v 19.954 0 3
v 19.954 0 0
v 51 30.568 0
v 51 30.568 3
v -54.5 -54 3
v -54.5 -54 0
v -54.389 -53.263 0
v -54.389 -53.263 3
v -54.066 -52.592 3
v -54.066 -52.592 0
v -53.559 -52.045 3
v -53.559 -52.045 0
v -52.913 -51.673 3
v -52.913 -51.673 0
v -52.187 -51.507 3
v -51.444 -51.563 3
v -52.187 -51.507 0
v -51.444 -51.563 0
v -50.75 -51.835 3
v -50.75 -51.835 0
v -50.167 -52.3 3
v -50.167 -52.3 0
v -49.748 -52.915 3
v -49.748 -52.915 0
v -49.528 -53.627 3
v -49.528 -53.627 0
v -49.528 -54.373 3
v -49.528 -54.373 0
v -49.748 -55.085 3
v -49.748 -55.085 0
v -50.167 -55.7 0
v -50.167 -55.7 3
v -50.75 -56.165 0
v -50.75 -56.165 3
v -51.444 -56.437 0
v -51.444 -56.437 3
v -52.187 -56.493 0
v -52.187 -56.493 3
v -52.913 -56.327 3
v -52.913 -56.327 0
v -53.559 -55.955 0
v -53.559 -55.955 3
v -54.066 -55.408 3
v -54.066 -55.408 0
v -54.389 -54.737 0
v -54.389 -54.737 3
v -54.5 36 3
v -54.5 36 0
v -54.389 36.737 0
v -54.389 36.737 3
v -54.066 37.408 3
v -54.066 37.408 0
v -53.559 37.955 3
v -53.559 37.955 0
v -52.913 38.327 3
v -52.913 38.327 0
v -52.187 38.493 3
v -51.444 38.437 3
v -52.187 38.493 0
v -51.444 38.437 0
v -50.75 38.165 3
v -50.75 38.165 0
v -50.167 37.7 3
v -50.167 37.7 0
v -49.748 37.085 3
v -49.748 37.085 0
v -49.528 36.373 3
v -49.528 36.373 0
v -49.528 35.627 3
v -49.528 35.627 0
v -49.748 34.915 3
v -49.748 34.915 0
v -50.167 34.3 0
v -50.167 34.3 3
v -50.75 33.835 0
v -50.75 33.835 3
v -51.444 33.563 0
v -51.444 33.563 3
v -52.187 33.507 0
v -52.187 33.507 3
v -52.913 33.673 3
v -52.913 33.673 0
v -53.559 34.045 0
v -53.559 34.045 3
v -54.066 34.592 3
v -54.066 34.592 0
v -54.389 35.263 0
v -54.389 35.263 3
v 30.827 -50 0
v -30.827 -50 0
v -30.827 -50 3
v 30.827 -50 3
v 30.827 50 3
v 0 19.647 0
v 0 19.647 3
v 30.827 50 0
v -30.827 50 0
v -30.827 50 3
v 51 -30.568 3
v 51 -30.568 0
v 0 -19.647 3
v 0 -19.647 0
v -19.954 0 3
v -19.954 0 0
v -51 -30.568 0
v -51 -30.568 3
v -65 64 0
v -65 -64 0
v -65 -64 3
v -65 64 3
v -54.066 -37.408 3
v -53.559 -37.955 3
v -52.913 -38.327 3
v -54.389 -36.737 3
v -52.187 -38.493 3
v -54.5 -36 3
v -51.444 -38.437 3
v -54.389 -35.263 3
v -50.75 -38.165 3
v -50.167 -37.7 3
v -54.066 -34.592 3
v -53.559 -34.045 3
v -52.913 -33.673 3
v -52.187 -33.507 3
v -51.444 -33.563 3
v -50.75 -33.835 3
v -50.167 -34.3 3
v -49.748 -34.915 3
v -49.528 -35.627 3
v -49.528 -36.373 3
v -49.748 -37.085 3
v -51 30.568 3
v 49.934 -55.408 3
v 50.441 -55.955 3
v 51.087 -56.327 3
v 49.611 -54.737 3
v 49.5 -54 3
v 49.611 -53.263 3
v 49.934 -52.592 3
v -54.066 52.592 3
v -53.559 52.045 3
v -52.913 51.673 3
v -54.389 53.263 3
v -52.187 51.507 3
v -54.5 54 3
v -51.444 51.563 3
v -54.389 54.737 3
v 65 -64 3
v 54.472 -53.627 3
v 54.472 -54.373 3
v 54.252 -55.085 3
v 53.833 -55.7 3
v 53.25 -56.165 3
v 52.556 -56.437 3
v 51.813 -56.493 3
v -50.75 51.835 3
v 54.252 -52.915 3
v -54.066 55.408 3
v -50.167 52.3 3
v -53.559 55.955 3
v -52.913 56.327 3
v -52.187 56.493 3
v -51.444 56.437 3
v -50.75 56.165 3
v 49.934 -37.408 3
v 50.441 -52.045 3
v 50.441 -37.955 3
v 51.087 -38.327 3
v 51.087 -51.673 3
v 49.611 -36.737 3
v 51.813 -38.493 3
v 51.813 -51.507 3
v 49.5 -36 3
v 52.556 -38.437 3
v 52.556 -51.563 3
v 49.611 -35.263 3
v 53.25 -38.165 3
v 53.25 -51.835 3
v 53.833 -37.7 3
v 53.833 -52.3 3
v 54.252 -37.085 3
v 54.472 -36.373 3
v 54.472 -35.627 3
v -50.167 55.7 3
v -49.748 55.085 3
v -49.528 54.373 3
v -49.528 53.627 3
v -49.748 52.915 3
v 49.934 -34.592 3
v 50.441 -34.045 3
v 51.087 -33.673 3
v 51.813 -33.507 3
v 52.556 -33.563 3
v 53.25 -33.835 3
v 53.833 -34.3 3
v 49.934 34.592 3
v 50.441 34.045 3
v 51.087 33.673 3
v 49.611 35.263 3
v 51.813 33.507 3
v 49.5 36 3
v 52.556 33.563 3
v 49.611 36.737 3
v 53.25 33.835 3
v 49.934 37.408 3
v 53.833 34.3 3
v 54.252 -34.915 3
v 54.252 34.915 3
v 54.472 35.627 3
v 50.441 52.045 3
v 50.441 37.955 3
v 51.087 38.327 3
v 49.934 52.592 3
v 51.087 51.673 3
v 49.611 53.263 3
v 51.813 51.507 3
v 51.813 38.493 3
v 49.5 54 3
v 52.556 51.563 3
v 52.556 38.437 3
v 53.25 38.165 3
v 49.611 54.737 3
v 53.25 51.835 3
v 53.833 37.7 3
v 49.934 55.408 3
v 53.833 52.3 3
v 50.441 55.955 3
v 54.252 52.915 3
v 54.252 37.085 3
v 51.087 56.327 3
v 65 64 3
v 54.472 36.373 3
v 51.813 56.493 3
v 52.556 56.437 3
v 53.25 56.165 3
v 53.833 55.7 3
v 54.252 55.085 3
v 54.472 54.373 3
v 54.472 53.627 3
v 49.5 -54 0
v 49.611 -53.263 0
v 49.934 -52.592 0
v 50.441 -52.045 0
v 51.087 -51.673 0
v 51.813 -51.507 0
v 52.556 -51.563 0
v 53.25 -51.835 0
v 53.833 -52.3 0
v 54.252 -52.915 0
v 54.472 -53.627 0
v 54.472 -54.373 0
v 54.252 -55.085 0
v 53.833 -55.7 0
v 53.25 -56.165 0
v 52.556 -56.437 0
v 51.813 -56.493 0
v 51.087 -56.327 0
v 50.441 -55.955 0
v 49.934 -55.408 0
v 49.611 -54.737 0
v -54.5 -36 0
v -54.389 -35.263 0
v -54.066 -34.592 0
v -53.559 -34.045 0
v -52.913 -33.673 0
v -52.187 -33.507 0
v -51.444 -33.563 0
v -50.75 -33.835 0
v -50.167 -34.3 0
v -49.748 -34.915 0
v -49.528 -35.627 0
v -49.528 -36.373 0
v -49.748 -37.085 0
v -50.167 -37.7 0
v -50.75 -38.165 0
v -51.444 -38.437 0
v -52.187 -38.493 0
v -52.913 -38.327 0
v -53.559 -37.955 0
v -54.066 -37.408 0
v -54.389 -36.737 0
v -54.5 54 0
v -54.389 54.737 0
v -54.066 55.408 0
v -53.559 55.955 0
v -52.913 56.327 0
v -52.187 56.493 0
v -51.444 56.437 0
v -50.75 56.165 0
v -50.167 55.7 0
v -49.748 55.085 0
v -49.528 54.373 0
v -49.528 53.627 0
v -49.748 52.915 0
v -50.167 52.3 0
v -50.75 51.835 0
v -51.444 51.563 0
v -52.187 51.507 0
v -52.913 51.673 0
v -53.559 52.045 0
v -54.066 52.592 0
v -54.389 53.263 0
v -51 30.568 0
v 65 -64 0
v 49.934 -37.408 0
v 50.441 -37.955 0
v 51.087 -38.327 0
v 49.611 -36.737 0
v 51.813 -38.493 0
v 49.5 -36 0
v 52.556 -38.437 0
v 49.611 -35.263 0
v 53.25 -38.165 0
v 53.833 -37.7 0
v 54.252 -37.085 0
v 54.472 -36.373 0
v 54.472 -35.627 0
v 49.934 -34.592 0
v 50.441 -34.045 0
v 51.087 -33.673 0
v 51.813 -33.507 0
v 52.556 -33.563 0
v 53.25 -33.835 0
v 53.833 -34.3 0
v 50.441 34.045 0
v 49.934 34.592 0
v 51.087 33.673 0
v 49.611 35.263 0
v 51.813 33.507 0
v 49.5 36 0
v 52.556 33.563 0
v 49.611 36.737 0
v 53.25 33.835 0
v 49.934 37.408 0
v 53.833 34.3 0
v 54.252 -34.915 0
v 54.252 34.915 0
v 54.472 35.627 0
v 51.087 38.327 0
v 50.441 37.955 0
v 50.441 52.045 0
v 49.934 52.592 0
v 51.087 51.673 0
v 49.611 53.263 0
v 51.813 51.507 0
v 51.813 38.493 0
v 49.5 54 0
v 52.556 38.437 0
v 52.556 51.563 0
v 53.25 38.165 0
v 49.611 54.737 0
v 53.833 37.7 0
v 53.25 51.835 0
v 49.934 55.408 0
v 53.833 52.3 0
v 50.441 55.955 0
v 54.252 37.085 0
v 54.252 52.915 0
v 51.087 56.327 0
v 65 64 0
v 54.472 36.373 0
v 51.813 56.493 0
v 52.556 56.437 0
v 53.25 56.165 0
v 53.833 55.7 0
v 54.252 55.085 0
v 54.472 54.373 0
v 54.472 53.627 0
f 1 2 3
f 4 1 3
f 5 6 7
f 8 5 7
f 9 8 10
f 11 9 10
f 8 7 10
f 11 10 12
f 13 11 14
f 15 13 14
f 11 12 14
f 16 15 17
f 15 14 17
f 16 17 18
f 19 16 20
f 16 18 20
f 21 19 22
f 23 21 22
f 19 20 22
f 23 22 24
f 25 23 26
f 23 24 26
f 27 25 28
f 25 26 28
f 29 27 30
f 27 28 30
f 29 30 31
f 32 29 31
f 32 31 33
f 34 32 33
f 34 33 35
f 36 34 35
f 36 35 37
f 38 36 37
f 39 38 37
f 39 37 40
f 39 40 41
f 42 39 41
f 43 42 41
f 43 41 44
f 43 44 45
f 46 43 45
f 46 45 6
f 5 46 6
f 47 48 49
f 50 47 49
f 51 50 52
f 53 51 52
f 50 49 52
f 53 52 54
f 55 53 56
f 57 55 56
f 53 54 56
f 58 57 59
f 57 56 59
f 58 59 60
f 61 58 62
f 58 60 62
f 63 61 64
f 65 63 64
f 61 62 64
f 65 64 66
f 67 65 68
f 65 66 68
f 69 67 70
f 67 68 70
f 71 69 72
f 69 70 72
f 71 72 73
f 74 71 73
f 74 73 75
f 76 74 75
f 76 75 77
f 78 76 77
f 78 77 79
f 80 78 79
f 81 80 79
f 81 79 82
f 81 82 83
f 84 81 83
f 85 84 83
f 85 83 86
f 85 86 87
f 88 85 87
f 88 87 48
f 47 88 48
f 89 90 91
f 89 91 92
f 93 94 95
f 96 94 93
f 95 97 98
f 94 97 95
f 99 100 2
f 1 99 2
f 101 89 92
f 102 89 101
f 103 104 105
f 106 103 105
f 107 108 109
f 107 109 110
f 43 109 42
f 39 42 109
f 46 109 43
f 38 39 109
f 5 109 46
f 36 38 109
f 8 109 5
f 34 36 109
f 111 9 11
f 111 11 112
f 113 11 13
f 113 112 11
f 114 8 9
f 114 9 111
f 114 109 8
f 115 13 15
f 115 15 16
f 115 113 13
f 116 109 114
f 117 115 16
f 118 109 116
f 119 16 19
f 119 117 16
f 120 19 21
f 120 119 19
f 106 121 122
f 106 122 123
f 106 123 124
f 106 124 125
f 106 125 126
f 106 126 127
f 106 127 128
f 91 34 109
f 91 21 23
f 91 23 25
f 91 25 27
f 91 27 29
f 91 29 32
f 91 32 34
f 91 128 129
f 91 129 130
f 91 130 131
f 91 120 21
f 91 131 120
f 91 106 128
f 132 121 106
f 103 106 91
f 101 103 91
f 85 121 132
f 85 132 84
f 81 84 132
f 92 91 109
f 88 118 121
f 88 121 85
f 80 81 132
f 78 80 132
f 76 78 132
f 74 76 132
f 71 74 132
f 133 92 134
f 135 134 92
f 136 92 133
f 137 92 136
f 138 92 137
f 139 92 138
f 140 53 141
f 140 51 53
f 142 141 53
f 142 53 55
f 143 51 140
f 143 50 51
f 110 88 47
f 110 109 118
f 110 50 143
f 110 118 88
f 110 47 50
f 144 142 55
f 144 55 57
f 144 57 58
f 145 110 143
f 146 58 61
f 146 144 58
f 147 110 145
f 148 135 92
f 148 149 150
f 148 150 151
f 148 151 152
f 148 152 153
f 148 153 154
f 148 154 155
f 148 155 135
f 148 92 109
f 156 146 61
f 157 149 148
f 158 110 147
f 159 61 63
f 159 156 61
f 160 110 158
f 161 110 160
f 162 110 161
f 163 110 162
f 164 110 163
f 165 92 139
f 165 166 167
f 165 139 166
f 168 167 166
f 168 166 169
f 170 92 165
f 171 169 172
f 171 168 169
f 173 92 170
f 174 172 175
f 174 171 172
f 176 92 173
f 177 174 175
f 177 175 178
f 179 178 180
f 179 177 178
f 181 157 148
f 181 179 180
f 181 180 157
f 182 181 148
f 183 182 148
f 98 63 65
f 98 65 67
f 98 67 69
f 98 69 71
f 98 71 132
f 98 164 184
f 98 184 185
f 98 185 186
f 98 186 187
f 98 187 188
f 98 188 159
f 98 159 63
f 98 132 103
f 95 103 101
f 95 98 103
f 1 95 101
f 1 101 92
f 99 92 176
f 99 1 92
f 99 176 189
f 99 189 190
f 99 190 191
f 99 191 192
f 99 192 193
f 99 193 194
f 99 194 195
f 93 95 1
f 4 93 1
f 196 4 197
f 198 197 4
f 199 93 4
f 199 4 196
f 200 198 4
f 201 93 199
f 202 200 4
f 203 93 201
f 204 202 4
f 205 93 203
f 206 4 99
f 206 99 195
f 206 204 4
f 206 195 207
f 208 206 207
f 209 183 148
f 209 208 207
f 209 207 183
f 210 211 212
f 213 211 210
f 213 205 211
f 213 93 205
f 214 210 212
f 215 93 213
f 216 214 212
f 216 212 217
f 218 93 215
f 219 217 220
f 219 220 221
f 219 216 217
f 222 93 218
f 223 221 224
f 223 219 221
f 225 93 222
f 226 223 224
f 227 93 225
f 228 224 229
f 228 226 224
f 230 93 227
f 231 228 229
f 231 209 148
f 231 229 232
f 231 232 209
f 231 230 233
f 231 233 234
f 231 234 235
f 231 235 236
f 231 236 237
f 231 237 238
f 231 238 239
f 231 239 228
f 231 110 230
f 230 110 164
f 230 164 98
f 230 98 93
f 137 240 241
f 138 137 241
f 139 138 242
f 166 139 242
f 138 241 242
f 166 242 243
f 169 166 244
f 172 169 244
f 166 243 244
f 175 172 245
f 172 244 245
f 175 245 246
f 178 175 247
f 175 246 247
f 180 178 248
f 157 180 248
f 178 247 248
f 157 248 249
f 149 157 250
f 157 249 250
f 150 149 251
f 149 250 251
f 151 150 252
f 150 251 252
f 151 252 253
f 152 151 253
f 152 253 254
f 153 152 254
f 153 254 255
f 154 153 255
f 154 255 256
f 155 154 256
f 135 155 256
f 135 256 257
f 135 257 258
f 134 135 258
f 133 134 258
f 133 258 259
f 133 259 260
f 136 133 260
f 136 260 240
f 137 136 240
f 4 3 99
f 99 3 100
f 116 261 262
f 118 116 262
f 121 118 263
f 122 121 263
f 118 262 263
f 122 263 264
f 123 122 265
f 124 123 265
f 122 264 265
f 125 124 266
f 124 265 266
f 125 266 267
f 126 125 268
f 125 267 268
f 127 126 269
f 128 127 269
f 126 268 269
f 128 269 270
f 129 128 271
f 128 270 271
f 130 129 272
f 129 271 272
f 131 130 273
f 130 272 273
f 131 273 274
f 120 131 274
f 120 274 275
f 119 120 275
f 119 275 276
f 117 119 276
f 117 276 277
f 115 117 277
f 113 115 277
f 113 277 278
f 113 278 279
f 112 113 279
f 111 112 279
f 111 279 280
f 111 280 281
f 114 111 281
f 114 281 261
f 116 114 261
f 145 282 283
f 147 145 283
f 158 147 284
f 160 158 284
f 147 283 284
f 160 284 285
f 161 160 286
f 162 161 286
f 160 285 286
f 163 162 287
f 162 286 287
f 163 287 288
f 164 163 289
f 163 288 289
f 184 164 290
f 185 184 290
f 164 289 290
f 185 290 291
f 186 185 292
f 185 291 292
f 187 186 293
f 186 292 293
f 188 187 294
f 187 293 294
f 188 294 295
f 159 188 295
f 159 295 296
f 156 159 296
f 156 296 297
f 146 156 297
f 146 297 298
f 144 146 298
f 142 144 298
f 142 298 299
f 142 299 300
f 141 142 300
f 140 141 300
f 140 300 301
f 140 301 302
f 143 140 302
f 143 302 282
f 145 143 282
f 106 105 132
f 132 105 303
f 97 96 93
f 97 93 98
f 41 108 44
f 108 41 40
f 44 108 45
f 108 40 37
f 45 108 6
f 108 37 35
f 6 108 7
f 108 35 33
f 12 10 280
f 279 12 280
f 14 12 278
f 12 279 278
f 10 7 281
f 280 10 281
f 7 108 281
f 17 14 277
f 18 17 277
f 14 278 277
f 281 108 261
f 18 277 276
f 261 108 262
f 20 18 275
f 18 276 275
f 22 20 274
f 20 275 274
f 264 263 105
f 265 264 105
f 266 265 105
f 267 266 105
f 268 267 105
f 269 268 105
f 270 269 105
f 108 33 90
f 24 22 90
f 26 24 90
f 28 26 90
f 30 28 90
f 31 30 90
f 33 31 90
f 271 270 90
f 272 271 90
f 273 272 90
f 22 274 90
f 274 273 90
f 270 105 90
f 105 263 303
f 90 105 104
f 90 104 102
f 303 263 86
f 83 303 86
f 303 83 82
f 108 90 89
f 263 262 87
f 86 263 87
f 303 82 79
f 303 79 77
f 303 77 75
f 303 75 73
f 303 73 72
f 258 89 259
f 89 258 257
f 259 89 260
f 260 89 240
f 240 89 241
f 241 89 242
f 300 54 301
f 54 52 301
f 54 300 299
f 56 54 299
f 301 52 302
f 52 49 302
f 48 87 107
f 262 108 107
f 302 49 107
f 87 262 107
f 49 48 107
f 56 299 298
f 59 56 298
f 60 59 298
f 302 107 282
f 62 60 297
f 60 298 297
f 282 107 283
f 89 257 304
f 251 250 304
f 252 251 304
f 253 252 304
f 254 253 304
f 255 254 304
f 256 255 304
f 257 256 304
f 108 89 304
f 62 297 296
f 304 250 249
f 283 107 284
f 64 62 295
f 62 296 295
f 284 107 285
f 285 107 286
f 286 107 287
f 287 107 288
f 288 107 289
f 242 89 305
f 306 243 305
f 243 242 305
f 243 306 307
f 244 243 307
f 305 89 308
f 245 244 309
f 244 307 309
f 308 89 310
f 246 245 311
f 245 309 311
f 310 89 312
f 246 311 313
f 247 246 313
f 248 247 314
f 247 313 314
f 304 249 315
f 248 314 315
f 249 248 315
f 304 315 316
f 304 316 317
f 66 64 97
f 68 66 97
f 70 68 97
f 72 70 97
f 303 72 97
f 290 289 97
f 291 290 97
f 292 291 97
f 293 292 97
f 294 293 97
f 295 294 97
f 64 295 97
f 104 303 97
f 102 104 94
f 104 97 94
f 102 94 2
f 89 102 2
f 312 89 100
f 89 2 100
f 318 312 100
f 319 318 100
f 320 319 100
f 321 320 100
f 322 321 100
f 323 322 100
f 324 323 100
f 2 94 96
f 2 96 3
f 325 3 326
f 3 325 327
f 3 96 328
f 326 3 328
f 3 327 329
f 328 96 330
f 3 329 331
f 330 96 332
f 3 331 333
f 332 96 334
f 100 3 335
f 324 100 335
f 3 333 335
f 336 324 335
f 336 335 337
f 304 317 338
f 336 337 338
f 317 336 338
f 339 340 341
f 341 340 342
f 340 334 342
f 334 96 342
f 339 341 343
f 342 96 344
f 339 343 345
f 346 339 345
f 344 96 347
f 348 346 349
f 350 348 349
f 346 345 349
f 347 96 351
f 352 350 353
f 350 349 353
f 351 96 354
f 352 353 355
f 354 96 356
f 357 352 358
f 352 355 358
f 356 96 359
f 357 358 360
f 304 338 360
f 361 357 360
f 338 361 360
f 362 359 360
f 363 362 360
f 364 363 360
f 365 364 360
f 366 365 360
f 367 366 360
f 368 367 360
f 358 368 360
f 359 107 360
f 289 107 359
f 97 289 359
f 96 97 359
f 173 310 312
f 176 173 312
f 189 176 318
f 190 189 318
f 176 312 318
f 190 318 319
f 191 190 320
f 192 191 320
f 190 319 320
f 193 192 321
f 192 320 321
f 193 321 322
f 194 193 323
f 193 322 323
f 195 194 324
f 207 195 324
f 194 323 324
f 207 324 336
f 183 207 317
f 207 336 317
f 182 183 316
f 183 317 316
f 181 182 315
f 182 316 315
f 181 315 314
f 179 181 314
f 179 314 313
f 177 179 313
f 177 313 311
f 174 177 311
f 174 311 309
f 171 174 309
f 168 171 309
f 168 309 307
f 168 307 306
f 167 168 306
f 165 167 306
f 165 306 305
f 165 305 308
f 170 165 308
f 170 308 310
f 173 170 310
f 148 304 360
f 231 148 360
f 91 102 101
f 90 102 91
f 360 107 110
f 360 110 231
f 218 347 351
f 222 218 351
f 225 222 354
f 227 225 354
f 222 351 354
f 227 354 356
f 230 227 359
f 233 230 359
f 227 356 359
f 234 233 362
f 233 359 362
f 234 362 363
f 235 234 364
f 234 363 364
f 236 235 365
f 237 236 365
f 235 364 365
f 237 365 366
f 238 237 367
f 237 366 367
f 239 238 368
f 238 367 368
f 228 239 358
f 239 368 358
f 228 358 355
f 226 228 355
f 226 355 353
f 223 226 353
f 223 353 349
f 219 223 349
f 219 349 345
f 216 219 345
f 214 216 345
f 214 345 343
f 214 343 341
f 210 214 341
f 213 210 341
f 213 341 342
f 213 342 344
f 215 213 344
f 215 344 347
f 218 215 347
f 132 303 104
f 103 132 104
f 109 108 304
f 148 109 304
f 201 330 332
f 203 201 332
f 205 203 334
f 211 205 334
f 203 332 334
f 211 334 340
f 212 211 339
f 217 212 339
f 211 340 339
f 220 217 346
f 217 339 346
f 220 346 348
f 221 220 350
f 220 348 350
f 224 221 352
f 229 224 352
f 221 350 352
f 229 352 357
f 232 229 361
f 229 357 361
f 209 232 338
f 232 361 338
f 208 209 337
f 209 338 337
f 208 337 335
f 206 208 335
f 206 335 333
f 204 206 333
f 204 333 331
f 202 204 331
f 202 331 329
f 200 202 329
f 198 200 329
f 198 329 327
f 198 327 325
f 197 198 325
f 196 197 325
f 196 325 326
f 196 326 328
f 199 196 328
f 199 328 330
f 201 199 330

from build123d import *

# Parameters (mm, degrees)
SKETCH_2_W          = 130
SKETCH_2_H          = 128
EXTRUDE_1_DEPTH     = 3
SKETCH_3_R          = 2.5
CUT_EXTRUDE_1_DEPTH = 92.268833673


with BuildPart() as part:
    # 草圖2 → 填料-伸長1 (new body)
    with BuildSketch(Plane.XY):
        Rectangle(SKETCH_2_W, SKETCH_2_H)
        Polygon((0, 19.647280252), (30.826980994, 50), (-30.826980994, 50), align=None, mode=Mode.SUBTRACT)
        Polygon((-51, 30.568104363), (-19.954269006, 0), (-51, -30.568104363), align=None, mode=Mode.SUBTRACT)
        Polygon((19.954269006, 0), (51, 30.568104363), (51, -30.568104363), align=None, mode=Mode.SUBTRACT)
        Polygon((30.826980994, -50), (0, -19.647280252), (-30.826980994, -50), align=None, mode=Mode.SUBTRACT)
    extrude(amount=EXTRUDE_1_DEPTH)

    # 草圖3 → 除料-伸長1 (cut, through all)
    with BuildSketch(Plane(origin=(0, 0, 0), x_dir=(-1, 0, 0), z_dir=(0, 0, -1))):
        with Locations((-52, -54)):
            Circle(SKETCH_3_R)
        with Locations((-52, -36)):
            Circle(SKETCH_3_R)
        with Locations((52, -54)):
            Circle(SKETCH_3_R)
        with Locations((52, -36)):
            Circle(SKETCH_3_R)
        with Locations((-52, 54)):
            Circle(SKETCH_3_R)
        with Locations((-52, 36)):
            Circle(SKETCH_3_R)
        with Locations((52, 54)):
            Circle(SKETCH_3_R)
        with Locations((52, 36)):
            Circle(SKETCH_3_R)
    extrude(amount=-CUT_EXTRUDE_1_DEPTH, mode=Mode.SUBTRACT)


solid = part.part
